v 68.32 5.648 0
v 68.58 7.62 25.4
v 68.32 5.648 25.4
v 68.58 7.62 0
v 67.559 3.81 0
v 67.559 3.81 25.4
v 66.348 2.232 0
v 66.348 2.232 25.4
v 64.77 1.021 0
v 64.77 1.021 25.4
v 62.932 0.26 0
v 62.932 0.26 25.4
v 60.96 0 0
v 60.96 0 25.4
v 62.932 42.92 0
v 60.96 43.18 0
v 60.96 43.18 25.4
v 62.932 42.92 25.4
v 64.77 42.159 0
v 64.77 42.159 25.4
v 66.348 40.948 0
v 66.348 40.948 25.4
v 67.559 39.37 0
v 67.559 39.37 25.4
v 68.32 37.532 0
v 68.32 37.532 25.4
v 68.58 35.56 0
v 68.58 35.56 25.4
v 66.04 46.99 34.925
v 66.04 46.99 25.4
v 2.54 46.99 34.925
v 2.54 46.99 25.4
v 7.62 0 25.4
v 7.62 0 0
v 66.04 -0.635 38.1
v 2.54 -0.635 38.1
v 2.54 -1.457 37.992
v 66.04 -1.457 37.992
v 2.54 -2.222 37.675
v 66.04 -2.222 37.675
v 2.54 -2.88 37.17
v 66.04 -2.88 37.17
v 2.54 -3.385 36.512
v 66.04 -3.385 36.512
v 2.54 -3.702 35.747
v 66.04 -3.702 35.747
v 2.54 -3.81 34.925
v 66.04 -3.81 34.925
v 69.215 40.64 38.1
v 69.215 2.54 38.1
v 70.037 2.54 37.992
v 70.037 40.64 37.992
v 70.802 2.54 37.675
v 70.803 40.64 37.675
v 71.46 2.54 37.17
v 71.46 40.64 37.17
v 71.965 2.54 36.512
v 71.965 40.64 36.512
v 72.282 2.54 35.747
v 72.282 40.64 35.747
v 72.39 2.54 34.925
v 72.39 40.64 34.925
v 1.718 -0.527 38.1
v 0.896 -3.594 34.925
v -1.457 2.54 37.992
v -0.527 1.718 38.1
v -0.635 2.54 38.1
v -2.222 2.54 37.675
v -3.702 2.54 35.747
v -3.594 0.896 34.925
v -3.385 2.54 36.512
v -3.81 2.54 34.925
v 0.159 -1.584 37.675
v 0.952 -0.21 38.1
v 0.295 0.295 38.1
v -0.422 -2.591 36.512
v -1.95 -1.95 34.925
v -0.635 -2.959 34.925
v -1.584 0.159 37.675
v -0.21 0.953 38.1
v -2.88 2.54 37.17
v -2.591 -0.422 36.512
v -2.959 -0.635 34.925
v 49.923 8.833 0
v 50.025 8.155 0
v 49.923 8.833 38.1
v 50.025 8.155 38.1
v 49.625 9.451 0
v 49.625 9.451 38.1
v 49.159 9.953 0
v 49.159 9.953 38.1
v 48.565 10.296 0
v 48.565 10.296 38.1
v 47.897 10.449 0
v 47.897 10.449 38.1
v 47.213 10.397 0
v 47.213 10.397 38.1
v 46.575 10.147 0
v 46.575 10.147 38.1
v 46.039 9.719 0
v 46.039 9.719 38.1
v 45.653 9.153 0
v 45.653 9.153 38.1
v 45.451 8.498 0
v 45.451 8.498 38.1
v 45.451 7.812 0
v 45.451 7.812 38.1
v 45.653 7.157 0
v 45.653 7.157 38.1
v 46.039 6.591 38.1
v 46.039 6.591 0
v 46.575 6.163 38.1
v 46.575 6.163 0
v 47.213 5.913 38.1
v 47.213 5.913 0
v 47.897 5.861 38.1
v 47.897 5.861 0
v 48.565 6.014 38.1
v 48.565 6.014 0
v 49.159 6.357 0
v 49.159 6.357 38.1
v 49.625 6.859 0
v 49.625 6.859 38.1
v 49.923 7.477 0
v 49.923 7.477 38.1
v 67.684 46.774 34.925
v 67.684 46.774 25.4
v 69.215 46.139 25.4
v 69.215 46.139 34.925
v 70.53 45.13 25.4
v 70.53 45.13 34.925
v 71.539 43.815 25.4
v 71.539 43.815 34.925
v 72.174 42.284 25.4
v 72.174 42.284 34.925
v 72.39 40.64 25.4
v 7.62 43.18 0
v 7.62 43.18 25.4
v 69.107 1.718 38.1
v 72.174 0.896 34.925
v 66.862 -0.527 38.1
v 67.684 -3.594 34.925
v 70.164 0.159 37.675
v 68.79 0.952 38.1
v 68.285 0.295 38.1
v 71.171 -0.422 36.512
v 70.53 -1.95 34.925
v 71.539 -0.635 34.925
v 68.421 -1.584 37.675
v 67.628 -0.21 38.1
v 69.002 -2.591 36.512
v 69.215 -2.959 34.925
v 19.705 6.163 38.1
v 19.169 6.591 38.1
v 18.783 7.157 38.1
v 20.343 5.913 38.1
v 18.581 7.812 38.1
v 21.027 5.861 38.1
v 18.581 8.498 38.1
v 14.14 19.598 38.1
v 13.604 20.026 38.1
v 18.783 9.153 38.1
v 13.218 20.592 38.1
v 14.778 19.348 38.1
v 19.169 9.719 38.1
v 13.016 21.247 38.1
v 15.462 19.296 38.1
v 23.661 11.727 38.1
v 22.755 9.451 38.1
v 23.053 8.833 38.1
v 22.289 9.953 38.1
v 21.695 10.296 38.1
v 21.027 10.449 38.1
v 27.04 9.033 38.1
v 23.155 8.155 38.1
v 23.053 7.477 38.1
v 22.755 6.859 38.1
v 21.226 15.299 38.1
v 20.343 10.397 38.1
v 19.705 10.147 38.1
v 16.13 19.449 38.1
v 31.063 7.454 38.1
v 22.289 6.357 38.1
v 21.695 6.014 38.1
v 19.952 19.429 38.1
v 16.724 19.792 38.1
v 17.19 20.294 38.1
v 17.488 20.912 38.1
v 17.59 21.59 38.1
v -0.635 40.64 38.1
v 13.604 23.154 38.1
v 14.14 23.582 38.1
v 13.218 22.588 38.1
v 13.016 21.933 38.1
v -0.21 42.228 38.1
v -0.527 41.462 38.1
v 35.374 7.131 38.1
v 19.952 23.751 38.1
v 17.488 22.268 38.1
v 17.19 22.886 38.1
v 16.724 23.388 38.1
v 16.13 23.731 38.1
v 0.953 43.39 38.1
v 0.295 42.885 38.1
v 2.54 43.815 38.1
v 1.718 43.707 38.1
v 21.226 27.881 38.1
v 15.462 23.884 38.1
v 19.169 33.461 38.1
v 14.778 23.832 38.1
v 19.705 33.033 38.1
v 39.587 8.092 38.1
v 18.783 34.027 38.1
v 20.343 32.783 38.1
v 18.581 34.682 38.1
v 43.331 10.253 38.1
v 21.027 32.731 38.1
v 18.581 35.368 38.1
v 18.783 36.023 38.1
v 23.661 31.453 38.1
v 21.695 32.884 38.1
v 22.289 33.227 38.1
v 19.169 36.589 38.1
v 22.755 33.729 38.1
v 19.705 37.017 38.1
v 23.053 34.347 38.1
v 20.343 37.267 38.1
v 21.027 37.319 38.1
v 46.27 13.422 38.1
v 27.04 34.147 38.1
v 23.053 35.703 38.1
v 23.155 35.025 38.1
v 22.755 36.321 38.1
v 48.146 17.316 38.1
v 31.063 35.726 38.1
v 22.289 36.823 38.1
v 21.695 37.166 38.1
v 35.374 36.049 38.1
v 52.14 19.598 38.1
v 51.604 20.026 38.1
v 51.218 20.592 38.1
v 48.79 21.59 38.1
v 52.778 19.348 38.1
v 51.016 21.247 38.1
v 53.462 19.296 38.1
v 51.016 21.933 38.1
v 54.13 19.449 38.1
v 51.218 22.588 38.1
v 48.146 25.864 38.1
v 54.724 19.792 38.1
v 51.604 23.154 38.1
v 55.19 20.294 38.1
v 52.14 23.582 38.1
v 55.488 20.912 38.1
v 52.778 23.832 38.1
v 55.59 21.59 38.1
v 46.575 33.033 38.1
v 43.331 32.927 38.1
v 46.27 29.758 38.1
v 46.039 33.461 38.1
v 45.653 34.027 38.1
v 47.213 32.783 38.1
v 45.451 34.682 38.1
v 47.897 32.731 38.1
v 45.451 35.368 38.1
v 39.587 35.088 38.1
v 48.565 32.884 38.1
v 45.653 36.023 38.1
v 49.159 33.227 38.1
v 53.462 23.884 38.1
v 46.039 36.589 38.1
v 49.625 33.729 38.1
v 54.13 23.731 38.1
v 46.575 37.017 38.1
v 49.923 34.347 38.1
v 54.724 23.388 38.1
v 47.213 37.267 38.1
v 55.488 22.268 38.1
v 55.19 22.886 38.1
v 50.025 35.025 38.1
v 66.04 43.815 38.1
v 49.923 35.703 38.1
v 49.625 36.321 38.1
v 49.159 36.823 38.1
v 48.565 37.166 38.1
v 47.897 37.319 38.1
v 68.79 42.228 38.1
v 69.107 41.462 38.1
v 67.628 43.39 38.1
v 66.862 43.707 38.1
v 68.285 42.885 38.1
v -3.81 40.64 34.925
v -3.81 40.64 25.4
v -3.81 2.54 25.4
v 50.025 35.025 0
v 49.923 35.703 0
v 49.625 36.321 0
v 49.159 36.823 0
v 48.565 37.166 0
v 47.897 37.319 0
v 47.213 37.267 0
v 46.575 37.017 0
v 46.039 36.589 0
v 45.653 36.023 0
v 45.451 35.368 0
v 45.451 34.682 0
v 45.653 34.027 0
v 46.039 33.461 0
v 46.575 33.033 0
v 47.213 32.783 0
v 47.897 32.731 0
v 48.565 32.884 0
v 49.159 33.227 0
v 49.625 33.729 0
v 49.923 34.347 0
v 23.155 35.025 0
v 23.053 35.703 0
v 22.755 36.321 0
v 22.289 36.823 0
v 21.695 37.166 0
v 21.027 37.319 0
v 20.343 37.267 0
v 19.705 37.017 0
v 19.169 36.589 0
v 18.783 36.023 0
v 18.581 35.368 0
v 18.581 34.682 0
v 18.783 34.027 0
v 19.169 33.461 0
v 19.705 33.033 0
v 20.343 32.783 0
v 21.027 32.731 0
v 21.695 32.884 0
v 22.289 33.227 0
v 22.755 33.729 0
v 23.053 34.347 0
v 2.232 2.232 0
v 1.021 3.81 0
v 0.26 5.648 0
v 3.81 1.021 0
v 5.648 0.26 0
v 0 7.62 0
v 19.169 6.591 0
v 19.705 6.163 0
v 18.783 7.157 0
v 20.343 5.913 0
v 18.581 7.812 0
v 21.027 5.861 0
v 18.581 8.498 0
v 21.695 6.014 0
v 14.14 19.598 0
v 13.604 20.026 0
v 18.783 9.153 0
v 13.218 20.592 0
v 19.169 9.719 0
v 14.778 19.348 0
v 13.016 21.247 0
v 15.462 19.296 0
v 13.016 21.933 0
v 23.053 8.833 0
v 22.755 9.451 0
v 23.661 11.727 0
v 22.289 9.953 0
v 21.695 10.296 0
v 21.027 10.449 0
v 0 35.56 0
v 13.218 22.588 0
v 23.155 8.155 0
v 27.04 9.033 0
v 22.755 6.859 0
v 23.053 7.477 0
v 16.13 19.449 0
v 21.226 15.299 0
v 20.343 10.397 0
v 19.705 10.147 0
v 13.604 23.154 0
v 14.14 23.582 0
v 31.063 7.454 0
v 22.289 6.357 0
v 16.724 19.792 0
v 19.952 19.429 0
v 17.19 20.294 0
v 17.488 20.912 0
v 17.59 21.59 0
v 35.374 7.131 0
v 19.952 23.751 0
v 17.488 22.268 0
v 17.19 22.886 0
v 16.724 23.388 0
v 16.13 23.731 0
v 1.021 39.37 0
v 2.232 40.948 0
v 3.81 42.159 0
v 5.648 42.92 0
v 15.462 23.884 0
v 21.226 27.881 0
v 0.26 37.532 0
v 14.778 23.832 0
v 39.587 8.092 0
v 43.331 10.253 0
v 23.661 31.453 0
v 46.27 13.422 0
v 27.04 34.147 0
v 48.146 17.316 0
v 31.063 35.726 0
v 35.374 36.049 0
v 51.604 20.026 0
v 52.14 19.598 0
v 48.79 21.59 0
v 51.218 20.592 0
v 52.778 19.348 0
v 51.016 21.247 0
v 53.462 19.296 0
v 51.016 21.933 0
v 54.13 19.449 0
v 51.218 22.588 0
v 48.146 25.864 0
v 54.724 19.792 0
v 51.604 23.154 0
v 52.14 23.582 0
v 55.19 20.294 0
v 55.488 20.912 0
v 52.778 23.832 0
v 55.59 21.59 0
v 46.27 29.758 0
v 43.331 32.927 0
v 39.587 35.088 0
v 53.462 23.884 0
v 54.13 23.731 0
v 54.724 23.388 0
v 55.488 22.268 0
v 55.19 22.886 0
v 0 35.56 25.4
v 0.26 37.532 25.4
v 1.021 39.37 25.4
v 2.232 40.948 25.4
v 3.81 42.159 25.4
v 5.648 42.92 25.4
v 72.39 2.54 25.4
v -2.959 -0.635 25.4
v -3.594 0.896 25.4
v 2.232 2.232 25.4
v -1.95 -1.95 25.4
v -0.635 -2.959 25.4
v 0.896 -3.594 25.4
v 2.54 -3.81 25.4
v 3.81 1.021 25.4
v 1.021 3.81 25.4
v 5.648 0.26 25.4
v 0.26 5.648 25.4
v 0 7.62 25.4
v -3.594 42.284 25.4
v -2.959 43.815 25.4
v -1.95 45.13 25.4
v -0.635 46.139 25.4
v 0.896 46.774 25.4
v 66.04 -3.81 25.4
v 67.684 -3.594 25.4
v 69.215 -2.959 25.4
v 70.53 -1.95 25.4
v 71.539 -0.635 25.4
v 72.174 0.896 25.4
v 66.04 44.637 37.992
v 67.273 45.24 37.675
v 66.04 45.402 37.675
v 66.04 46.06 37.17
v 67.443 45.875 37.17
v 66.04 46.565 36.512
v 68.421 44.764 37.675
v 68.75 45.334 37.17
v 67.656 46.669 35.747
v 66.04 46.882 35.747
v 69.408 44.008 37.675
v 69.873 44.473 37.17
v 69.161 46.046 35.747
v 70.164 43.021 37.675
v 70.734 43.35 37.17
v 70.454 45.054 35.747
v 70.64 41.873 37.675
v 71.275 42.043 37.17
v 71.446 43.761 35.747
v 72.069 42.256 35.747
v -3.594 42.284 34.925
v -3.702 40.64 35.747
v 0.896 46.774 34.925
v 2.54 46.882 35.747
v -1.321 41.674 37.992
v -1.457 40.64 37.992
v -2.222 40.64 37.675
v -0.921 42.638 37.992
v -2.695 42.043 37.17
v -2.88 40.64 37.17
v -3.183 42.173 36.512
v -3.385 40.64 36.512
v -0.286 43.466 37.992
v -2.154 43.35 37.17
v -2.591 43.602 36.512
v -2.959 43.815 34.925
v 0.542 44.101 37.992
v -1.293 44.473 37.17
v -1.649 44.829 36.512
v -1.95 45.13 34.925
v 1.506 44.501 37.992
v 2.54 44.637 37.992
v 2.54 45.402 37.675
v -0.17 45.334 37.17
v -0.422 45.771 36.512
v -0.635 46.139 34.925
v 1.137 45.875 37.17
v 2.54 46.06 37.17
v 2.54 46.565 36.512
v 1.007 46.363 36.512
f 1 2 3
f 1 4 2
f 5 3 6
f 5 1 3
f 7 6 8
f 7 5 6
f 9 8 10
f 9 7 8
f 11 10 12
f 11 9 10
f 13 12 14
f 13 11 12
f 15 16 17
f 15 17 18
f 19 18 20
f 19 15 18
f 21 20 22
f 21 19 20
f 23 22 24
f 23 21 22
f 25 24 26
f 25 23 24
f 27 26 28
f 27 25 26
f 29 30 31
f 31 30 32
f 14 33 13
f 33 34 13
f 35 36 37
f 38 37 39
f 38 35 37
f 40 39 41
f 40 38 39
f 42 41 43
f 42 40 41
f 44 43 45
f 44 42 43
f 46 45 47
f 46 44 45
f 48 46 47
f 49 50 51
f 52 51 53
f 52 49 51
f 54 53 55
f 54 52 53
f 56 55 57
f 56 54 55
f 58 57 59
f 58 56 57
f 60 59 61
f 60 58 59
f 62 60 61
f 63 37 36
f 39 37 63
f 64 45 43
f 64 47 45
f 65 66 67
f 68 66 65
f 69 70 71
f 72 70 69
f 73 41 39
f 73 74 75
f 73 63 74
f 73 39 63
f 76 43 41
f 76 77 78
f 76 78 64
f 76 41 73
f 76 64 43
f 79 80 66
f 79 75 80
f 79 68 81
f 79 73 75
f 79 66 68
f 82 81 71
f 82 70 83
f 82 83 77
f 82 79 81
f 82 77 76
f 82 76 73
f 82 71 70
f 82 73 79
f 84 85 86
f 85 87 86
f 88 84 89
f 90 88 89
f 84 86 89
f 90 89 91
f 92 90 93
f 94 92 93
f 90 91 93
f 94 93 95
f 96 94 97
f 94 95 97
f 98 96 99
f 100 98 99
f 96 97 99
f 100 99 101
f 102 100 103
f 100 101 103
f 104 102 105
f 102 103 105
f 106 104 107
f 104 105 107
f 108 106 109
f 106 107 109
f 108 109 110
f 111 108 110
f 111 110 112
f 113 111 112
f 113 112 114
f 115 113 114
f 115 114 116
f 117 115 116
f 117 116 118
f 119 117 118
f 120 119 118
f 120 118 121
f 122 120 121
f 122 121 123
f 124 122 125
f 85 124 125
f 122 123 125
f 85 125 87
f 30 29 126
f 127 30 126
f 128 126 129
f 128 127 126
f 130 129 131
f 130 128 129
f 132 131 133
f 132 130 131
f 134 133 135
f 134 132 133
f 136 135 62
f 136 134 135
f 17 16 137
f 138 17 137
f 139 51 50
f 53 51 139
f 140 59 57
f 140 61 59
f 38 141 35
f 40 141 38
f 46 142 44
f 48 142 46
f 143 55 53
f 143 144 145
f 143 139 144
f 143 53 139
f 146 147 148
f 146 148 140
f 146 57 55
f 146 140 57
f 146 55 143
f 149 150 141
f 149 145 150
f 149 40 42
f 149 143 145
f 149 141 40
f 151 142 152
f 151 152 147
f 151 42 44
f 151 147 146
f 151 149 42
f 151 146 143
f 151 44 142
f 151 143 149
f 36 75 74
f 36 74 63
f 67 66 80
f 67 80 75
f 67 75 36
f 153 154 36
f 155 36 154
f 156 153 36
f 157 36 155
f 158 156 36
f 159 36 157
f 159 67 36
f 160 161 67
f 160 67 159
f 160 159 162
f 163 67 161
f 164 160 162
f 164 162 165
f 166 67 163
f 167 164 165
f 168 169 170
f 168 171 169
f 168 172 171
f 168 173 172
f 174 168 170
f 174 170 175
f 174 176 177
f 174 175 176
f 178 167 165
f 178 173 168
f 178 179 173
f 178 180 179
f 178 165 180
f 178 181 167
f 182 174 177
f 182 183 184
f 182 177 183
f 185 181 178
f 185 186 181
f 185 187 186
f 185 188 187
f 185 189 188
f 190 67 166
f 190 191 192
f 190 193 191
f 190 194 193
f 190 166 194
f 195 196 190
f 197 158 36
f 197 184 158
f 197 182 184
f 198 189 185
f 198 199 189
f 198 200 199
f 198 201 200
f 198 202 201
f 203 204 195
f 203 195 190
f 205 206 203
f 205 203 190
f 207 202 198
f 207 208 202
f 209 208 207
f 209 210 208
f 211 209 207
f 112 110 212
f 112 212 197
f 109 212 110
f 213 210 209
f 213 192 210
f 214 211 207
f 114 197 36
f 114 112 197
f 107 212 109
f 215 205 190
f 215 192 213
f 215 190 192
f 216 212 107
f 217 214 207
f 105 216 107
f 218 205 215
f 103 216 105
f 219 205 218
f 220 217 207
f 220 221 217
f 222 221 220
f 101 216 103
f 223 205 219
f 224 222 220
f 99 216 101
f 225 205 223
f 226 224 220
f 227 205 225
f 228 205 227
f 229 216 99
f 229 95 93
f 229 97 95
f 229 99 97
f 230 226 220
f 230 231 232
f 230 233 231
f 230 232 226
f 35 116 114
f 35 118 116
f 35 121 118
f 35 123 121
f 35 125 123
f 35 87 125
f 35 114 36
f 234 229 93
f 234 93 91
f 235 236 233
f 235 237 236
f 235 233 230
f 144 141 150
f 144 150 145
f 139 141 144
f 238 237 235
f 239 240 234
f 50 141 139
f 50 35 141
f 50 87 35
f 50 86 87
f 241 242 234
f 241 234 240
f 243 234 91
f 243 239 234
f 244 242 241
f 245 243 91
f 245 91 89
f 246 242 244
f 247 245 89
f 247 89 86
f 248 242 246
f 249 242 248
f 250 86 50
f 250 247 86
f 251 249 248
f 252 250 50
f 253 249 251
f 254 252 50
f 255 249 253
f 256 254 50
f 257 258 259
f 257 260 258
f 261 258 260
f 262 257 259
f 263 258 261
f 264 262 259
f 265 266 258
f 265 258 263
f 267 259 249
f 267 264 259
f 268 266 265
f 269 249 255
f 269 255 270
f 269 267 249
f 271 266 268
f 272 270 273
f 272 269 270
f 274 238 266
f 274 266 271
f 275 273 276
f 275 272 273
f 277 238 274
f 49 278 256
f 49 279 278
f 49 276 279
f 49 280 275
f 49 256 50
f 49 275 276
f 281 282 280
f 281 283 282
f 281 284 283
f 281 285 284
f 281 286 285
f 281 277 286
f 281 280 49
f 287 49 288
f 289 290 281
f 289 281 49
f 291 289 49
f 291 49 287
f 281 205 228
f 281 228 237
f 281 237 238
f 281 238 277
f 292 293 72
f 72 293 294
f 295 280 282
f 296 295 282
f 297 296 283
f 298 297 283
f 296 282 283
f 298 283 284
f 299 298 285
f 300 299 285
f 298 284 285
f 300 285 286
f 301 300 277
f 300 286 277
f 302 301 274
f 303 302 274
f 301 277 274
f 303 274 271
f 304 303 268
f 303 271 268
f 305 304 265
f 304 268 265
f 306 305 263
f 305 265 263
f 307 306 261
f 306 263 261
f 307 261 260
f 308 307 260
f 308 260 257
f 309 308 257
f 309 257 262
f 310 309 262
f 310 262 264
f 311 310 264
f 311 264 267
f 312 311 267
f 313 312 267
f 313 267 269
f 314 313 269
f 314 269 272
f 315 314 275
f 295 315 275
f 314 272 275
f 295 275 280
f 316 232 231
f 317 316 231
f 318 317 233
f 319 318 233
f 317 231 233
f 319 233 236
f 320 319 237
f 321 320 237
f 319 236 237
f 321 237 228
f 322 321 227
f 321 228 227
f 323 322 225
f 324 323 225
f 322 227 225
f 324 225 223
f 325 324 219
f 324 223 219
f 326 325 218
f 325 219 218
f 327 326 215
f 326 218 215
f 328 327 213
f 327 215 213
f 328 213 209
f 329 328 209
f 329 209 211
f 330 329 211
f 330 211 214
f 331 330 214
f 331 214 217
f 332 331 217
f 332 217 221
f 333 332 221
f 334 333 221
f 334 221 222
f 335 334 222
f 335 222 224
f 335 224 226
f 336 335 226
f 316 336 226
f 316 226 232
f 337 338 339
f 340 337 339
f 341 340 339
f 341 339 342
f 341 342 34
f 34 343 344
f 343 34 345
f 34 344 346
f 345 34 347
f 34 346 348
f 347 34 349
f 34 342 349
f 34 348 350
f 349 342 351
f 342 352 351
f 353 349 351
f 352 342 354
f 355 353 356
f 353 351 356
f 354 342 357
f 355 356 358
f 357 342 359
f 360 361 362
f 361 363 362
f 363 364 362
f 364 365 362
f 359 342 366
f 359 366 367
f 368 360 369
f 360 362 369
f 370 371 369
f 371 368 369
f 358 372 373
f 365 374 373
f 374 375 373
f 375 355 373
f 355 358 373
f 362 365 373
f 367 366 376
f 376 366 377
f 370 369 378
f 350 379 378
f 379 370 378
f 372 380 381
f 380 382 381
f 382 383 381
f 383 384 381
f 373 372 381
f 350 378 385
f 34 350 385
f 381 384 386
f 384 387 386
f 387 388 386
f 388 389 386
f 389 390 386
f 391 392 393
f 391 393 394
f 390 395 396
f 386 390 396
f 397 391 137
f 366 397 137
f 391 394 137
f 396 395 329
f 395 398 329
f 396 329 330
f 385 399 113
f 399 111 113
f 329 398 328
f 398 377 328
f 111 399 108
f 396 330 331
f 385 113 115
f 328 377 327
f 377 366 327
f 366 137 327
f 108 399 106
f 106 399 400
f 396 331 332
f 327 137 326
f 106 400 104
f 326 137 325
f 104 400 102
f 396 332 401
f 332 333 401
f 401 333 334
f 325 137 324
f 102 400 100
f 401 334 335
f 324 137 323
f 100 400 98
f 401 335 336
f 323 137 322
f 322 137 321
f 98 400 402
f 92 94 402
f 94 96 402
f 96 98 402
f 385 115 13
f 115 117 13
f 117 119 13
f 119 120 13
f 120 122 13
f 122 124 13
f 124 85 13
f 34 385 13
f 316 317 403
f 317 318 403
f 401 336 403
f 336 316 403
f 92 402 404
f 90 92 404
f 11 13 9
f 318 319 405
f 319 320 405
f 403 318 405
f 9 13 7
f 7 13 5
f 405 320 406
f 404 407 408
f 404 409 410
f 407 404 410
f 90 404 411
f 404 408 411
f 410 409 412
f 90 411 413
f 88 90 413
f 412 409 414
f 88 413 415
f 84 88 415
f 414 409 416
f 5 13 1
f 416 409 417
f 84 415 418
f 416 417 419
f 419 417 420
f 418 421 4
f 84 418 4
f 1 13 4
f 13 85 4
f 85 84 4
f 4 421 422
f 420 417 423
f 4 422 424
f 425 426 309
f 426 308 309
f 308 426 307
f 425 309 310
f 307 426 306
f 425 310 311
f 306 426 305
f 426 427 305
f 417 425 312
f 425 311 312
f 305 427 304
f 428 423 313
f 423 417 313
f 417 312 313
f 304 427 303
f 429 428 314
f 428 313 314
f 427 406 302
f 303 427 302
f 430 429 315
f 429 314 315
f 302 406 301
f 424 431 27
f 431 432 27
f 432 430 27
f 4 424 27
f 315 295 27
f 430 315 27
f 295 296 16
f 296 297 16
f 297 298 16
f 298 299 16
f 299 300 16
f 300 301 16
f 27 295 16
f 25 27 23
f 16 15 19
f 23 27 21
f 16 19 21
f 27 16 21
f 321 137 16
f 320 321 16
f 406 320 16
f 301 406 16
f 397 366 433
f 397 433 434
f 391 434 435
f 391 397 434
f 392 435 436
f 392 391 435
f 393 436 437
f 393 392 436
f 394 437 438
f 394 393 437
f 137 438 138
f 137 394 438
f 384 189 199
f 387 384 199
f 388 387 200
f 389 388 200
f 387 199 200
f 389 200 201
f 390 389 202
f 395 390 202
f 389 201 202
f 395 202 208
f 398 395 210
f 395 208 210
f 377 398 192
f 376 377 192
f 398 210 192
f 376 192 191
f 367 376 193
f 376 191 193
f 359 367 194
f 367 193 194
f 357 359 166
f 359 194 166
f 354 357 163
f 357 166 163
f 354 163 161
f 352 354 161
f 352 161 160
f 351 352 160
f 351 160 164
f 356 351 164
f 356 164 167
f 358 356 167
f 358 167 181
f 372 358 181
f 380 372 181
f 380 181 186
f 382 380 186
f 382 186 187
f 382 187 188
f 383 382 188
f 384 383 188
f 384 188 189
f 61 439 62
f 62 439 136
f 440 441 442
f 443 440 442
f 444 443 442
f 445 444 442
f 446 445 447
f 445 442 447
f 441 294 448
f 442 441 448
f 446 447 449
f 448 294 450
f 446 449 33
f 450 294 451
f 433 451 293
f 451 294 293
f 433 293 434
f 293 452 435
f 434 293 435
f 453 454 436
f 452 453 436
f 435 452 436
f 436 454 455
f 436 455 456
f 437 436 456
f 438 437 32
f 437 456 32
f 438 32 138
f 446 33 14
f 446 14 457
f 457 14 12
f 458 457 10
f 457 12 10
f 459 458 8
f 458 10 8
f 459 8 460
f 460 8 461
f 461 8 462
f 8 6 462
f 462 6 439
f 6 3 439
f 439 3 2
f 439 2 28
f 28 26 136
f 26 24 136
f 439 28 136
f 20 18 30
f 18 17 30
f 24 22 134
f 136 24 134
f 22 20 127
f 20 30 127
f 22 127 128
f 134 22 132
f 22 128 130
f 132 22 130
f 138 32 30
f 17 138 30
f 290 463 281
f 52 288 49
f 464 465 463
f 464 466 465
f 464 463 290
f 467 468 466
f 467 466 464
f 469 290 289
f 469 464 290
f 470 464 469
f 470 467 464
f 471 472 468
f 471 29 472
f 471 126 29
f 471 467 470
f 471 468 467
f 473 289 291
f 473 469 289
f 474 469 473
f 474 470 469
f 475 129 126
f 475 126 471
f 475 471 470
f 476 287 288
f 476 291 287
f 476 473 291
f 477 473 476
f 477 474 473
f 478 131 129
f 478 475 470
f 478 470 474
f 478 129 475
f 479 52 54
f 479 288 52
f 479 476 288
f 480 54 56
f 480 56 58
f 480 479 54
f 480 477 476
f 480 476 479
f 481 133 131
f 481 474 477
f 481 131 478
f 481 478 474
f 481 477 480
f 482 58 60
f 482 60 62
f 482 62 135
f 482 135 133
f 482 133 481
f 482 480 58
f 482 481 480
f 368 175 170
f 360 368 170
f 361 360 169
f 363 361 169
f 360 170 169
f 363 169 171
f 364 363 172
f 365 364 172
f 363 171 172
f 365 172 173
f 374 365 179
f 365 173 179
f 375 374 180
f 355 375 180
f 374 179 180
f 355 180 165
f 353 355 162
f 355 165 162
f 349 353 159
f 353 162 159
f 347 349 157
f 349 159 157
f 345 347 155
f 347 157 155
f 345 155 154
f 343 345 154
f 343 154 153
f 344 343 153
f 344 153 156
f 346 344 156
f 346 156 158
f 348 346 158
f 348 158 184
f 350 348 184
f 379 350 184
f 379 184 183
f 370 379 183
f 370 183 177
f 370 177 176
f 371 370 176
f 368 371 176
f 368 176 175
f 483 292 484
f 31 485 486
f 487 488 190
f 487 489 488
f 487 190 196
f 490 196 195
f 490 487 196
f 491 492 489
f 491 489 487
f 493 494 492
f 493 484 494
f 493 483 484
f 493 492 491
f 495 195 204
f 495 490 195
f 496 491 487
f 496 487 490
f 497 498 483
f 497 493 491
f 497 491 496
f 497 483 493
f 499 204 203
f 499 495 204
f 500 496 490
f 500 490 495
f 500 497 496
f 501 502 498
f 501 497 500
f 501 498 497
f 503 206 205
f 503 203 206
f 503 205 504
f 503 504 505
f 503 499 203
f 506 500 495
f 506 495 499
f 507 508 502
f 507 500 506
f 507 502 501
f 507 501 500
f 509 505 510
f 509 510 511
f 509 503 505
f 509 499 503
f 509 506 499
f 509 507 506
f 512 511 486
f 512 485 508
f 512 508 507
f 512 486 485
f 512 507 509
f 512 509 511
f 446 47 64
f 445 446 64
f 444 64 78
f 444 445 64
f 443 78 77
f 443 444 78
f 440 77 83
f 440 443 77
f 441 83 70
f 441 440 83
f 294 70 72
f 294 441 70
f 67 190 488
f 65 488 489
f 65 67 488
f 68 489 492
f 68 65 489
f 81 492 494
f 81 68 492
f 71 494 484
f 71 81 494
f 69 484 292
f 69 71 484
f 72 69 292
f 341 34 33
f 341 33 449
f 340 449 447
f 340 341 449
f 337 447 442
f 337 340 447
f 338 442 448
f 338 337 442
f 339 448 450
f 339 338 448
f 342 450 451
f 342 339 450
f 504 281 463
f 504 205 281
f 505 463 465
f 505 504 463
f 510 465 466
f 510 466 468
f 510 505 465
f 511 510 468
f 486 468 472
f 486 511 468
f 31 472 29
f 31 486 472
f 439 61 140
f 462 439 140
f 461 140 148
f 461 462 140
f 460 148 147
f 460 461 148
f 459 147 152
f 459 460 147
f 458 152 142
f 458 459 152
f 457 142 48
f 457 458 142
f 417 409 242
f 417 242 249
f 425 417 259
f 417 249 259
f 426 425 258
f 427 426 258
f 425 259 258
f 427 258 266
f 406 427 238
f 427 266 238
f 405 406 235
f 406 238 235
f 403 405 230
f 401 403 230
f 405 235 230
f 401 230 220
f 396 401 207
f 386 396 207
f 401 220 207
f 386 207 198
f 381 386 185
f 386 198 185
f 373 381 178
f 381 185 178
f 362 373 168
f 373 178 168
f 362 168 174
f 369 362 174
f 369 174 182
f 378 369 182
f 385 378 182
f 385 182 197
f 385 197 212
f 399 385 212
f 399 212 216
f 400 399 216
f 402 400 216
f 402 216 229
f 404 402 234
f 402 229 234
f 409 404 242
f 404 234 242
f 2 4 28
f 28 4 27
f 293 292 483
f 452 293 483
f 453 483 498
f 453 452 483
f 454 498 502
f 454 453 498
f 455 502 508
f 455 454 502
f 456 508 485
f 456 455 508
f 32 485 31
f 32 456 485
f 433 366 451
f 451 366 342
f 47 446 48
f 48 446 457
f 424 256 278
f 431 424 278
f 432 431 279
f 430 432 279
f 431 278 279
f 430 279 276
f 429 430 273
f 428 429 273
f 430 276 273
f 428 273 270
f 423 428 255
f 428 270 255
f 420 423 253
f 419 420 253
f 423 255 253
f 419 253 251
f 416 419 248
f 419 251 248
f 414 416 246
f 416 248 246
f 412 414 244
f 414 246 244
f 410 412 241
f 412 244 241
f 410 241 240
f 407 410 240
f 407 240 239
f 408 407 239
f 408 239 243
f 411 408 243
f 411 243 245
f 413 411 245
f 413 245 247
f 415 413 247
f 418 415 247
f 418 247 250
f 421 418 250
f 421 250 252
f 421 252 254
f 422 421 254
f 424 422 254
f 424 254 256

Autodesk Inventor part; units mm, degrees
ref_plane "YZ Plane" through (0, 0, 0) normal (1, 0, 0) x (0, 1, 0)
ref_plane "XZ Plane" through (0, 0, 0) normal (0, 1, 0) x (-1, 0, 0)
ref_plane "XY Plane" through (0, 0, 0) normal (0, 0, 1) x (1, 0, 0)
sketch "Sketch1" plane through (0, 0, 0) normal (0, 0, 1) x (1, 0, 0)
  line L0 (7.62, 0) -> (60.96, 0)
  line L1 (68.58, 7.62) -> (68.58, 35.56)
  line L2 (60.96, 43.18) -> (7.62, 43.18)
  line L3 (0, 35.56) -> (0, 7.62)
  arc A0 (7.62, 43.18) -> (0, 35.56) centre (7.62, 35.56) ccw
  arc A1 (0, 7.62) -> (7.62, 0) centre (7.62, 7.62) ccw
  arc A2 (68.58, 35.56) -> (60.96, 43.18) centre (60.96, 35.56) ccw
  arc A3 (60.96, 0) -> (68.58, 7.62) centre (60.96, 7.62) ccw
  point P0 (0, 0)
  point P1 (68.58, 43.18)
  point P2 (68.58, 0)
  point P3 (0, 43.18)
  dimension "d0" = 68.58
  dimension "d1" = 43.18
  dimension "d3" = 7.62
extrude "Extrusion1" add sketch "Sketch1" along normal blind 25.4
sketch "Sketch2" plane through (0, 0, 25.4) normal (0, 0, 1) x (1, 0, 0)
  line L0 (2.54, -3.81) -> (66.04, -3.81)
  line L1 (72.39, 2.54) -> (72.39, 40.64)
  line L2 (66.04, 46.99) -> (2.54, 46.99)
  line L3 (-3.81, 40.64) -> (-3.81, 2.54)
  line L4 (60.96, 43.18) -> (7.62, 43.18) construction
  line L5 (0, 35.56) -> (0, 7.62) construction
  line L6 (7.62, 0) -> (60.96, 0) construction
  line L7 (68.58, 7.62) -> (68.58, 35.56) construction
  arc A0 (2.54, 46.99) -> (-3.81, 40.64) centre (2.54, 40.64) ccw
  arc A1 (-3.81, 2.54) -> (2.54, -3.81) centre (2.54, 2.54) ccw
  arc A2 (66.04, -3.81) -> (72.39, 2.54) centre (66.04, 2.54) ccw
  arc A3 (72.39, 40.64) -> (66.04, 46.99) centre (66.04, 40.64) ccw
  point P0 (0, 0)
  point P1 (72.39, 46.99)
  point P2 (72.39, -3.81)
  point P3 (-3.81, 46.99)
  point P4 (34.29, 46.99)
  point P5 (34.29, 43.18)
  point P6 (68.58, 21.59)
  point P7 (72.39, 21.59)
  dimension "d6" = 76.2
  dimension "d7" = 50.8
  dimension "d8" = 6.35
extrude "Extrusion2" add sketch "Sketch2" along normal blind 12.7
fillet "Fillet1" radius 3.175 8 edges at (-1.9501, 45.1301, 38.1) (-3.81, 21.59, 38.1) (-1.9501, -1.9501, 38.1) (34.29, -3.81, 38.1) (70.5301, -1.9501, 38.1) (72.39, 21.59, 38.1) (70.5301, 45.1301, 38.1) (34.29, 46.99, 38.1)
sketch "Sketch3" plane through (0, 0, 38.1) normal (0, 0, 1) x (1, 0, 0)
  circle A0 centre (34.29, 21.59) radius 14.5
  line L0 (-0.635, 2.54) -> (-0.635, 40.64) construction
  line L1 (2.54, 43.815) -> (66.04, 43.815) construction
  circle A1 centre (34.29, 21.59) radius 19 construction
  circle A2 centre (47.725, 35.025) radius 2.3
  circle A3 centre (15.29, 21.59) radius 2.3
  circle A4 centre (47.725, 8.155) radius 2.3
  circle A5 centre (53.29, 21.59) radius 2.3
  circle A6 centre (20.855, 35.025) radius 2.3
  circle A7 centre (20.855, 8.155) radius 2.3
  line L2 (20.855, 35.025) -> (34.29, 21.59) construction
  line L3 (34.29, 21.59) -> (15.29, 21.59) construction
  point P0 (0, 0)
  point P1 (34.29, 43.815)
  point P2 (-0.635, 21.59)
  dimension "d12" = 29
  dimension "d13" = 38
  dimension "d14" = 4.6
  dimension "d15" = 45
extrude "Extrusion3" cut sketch "Sketch3" against normal up to surface (38.1 mm away)
properties part number "2x3_Spacer"
